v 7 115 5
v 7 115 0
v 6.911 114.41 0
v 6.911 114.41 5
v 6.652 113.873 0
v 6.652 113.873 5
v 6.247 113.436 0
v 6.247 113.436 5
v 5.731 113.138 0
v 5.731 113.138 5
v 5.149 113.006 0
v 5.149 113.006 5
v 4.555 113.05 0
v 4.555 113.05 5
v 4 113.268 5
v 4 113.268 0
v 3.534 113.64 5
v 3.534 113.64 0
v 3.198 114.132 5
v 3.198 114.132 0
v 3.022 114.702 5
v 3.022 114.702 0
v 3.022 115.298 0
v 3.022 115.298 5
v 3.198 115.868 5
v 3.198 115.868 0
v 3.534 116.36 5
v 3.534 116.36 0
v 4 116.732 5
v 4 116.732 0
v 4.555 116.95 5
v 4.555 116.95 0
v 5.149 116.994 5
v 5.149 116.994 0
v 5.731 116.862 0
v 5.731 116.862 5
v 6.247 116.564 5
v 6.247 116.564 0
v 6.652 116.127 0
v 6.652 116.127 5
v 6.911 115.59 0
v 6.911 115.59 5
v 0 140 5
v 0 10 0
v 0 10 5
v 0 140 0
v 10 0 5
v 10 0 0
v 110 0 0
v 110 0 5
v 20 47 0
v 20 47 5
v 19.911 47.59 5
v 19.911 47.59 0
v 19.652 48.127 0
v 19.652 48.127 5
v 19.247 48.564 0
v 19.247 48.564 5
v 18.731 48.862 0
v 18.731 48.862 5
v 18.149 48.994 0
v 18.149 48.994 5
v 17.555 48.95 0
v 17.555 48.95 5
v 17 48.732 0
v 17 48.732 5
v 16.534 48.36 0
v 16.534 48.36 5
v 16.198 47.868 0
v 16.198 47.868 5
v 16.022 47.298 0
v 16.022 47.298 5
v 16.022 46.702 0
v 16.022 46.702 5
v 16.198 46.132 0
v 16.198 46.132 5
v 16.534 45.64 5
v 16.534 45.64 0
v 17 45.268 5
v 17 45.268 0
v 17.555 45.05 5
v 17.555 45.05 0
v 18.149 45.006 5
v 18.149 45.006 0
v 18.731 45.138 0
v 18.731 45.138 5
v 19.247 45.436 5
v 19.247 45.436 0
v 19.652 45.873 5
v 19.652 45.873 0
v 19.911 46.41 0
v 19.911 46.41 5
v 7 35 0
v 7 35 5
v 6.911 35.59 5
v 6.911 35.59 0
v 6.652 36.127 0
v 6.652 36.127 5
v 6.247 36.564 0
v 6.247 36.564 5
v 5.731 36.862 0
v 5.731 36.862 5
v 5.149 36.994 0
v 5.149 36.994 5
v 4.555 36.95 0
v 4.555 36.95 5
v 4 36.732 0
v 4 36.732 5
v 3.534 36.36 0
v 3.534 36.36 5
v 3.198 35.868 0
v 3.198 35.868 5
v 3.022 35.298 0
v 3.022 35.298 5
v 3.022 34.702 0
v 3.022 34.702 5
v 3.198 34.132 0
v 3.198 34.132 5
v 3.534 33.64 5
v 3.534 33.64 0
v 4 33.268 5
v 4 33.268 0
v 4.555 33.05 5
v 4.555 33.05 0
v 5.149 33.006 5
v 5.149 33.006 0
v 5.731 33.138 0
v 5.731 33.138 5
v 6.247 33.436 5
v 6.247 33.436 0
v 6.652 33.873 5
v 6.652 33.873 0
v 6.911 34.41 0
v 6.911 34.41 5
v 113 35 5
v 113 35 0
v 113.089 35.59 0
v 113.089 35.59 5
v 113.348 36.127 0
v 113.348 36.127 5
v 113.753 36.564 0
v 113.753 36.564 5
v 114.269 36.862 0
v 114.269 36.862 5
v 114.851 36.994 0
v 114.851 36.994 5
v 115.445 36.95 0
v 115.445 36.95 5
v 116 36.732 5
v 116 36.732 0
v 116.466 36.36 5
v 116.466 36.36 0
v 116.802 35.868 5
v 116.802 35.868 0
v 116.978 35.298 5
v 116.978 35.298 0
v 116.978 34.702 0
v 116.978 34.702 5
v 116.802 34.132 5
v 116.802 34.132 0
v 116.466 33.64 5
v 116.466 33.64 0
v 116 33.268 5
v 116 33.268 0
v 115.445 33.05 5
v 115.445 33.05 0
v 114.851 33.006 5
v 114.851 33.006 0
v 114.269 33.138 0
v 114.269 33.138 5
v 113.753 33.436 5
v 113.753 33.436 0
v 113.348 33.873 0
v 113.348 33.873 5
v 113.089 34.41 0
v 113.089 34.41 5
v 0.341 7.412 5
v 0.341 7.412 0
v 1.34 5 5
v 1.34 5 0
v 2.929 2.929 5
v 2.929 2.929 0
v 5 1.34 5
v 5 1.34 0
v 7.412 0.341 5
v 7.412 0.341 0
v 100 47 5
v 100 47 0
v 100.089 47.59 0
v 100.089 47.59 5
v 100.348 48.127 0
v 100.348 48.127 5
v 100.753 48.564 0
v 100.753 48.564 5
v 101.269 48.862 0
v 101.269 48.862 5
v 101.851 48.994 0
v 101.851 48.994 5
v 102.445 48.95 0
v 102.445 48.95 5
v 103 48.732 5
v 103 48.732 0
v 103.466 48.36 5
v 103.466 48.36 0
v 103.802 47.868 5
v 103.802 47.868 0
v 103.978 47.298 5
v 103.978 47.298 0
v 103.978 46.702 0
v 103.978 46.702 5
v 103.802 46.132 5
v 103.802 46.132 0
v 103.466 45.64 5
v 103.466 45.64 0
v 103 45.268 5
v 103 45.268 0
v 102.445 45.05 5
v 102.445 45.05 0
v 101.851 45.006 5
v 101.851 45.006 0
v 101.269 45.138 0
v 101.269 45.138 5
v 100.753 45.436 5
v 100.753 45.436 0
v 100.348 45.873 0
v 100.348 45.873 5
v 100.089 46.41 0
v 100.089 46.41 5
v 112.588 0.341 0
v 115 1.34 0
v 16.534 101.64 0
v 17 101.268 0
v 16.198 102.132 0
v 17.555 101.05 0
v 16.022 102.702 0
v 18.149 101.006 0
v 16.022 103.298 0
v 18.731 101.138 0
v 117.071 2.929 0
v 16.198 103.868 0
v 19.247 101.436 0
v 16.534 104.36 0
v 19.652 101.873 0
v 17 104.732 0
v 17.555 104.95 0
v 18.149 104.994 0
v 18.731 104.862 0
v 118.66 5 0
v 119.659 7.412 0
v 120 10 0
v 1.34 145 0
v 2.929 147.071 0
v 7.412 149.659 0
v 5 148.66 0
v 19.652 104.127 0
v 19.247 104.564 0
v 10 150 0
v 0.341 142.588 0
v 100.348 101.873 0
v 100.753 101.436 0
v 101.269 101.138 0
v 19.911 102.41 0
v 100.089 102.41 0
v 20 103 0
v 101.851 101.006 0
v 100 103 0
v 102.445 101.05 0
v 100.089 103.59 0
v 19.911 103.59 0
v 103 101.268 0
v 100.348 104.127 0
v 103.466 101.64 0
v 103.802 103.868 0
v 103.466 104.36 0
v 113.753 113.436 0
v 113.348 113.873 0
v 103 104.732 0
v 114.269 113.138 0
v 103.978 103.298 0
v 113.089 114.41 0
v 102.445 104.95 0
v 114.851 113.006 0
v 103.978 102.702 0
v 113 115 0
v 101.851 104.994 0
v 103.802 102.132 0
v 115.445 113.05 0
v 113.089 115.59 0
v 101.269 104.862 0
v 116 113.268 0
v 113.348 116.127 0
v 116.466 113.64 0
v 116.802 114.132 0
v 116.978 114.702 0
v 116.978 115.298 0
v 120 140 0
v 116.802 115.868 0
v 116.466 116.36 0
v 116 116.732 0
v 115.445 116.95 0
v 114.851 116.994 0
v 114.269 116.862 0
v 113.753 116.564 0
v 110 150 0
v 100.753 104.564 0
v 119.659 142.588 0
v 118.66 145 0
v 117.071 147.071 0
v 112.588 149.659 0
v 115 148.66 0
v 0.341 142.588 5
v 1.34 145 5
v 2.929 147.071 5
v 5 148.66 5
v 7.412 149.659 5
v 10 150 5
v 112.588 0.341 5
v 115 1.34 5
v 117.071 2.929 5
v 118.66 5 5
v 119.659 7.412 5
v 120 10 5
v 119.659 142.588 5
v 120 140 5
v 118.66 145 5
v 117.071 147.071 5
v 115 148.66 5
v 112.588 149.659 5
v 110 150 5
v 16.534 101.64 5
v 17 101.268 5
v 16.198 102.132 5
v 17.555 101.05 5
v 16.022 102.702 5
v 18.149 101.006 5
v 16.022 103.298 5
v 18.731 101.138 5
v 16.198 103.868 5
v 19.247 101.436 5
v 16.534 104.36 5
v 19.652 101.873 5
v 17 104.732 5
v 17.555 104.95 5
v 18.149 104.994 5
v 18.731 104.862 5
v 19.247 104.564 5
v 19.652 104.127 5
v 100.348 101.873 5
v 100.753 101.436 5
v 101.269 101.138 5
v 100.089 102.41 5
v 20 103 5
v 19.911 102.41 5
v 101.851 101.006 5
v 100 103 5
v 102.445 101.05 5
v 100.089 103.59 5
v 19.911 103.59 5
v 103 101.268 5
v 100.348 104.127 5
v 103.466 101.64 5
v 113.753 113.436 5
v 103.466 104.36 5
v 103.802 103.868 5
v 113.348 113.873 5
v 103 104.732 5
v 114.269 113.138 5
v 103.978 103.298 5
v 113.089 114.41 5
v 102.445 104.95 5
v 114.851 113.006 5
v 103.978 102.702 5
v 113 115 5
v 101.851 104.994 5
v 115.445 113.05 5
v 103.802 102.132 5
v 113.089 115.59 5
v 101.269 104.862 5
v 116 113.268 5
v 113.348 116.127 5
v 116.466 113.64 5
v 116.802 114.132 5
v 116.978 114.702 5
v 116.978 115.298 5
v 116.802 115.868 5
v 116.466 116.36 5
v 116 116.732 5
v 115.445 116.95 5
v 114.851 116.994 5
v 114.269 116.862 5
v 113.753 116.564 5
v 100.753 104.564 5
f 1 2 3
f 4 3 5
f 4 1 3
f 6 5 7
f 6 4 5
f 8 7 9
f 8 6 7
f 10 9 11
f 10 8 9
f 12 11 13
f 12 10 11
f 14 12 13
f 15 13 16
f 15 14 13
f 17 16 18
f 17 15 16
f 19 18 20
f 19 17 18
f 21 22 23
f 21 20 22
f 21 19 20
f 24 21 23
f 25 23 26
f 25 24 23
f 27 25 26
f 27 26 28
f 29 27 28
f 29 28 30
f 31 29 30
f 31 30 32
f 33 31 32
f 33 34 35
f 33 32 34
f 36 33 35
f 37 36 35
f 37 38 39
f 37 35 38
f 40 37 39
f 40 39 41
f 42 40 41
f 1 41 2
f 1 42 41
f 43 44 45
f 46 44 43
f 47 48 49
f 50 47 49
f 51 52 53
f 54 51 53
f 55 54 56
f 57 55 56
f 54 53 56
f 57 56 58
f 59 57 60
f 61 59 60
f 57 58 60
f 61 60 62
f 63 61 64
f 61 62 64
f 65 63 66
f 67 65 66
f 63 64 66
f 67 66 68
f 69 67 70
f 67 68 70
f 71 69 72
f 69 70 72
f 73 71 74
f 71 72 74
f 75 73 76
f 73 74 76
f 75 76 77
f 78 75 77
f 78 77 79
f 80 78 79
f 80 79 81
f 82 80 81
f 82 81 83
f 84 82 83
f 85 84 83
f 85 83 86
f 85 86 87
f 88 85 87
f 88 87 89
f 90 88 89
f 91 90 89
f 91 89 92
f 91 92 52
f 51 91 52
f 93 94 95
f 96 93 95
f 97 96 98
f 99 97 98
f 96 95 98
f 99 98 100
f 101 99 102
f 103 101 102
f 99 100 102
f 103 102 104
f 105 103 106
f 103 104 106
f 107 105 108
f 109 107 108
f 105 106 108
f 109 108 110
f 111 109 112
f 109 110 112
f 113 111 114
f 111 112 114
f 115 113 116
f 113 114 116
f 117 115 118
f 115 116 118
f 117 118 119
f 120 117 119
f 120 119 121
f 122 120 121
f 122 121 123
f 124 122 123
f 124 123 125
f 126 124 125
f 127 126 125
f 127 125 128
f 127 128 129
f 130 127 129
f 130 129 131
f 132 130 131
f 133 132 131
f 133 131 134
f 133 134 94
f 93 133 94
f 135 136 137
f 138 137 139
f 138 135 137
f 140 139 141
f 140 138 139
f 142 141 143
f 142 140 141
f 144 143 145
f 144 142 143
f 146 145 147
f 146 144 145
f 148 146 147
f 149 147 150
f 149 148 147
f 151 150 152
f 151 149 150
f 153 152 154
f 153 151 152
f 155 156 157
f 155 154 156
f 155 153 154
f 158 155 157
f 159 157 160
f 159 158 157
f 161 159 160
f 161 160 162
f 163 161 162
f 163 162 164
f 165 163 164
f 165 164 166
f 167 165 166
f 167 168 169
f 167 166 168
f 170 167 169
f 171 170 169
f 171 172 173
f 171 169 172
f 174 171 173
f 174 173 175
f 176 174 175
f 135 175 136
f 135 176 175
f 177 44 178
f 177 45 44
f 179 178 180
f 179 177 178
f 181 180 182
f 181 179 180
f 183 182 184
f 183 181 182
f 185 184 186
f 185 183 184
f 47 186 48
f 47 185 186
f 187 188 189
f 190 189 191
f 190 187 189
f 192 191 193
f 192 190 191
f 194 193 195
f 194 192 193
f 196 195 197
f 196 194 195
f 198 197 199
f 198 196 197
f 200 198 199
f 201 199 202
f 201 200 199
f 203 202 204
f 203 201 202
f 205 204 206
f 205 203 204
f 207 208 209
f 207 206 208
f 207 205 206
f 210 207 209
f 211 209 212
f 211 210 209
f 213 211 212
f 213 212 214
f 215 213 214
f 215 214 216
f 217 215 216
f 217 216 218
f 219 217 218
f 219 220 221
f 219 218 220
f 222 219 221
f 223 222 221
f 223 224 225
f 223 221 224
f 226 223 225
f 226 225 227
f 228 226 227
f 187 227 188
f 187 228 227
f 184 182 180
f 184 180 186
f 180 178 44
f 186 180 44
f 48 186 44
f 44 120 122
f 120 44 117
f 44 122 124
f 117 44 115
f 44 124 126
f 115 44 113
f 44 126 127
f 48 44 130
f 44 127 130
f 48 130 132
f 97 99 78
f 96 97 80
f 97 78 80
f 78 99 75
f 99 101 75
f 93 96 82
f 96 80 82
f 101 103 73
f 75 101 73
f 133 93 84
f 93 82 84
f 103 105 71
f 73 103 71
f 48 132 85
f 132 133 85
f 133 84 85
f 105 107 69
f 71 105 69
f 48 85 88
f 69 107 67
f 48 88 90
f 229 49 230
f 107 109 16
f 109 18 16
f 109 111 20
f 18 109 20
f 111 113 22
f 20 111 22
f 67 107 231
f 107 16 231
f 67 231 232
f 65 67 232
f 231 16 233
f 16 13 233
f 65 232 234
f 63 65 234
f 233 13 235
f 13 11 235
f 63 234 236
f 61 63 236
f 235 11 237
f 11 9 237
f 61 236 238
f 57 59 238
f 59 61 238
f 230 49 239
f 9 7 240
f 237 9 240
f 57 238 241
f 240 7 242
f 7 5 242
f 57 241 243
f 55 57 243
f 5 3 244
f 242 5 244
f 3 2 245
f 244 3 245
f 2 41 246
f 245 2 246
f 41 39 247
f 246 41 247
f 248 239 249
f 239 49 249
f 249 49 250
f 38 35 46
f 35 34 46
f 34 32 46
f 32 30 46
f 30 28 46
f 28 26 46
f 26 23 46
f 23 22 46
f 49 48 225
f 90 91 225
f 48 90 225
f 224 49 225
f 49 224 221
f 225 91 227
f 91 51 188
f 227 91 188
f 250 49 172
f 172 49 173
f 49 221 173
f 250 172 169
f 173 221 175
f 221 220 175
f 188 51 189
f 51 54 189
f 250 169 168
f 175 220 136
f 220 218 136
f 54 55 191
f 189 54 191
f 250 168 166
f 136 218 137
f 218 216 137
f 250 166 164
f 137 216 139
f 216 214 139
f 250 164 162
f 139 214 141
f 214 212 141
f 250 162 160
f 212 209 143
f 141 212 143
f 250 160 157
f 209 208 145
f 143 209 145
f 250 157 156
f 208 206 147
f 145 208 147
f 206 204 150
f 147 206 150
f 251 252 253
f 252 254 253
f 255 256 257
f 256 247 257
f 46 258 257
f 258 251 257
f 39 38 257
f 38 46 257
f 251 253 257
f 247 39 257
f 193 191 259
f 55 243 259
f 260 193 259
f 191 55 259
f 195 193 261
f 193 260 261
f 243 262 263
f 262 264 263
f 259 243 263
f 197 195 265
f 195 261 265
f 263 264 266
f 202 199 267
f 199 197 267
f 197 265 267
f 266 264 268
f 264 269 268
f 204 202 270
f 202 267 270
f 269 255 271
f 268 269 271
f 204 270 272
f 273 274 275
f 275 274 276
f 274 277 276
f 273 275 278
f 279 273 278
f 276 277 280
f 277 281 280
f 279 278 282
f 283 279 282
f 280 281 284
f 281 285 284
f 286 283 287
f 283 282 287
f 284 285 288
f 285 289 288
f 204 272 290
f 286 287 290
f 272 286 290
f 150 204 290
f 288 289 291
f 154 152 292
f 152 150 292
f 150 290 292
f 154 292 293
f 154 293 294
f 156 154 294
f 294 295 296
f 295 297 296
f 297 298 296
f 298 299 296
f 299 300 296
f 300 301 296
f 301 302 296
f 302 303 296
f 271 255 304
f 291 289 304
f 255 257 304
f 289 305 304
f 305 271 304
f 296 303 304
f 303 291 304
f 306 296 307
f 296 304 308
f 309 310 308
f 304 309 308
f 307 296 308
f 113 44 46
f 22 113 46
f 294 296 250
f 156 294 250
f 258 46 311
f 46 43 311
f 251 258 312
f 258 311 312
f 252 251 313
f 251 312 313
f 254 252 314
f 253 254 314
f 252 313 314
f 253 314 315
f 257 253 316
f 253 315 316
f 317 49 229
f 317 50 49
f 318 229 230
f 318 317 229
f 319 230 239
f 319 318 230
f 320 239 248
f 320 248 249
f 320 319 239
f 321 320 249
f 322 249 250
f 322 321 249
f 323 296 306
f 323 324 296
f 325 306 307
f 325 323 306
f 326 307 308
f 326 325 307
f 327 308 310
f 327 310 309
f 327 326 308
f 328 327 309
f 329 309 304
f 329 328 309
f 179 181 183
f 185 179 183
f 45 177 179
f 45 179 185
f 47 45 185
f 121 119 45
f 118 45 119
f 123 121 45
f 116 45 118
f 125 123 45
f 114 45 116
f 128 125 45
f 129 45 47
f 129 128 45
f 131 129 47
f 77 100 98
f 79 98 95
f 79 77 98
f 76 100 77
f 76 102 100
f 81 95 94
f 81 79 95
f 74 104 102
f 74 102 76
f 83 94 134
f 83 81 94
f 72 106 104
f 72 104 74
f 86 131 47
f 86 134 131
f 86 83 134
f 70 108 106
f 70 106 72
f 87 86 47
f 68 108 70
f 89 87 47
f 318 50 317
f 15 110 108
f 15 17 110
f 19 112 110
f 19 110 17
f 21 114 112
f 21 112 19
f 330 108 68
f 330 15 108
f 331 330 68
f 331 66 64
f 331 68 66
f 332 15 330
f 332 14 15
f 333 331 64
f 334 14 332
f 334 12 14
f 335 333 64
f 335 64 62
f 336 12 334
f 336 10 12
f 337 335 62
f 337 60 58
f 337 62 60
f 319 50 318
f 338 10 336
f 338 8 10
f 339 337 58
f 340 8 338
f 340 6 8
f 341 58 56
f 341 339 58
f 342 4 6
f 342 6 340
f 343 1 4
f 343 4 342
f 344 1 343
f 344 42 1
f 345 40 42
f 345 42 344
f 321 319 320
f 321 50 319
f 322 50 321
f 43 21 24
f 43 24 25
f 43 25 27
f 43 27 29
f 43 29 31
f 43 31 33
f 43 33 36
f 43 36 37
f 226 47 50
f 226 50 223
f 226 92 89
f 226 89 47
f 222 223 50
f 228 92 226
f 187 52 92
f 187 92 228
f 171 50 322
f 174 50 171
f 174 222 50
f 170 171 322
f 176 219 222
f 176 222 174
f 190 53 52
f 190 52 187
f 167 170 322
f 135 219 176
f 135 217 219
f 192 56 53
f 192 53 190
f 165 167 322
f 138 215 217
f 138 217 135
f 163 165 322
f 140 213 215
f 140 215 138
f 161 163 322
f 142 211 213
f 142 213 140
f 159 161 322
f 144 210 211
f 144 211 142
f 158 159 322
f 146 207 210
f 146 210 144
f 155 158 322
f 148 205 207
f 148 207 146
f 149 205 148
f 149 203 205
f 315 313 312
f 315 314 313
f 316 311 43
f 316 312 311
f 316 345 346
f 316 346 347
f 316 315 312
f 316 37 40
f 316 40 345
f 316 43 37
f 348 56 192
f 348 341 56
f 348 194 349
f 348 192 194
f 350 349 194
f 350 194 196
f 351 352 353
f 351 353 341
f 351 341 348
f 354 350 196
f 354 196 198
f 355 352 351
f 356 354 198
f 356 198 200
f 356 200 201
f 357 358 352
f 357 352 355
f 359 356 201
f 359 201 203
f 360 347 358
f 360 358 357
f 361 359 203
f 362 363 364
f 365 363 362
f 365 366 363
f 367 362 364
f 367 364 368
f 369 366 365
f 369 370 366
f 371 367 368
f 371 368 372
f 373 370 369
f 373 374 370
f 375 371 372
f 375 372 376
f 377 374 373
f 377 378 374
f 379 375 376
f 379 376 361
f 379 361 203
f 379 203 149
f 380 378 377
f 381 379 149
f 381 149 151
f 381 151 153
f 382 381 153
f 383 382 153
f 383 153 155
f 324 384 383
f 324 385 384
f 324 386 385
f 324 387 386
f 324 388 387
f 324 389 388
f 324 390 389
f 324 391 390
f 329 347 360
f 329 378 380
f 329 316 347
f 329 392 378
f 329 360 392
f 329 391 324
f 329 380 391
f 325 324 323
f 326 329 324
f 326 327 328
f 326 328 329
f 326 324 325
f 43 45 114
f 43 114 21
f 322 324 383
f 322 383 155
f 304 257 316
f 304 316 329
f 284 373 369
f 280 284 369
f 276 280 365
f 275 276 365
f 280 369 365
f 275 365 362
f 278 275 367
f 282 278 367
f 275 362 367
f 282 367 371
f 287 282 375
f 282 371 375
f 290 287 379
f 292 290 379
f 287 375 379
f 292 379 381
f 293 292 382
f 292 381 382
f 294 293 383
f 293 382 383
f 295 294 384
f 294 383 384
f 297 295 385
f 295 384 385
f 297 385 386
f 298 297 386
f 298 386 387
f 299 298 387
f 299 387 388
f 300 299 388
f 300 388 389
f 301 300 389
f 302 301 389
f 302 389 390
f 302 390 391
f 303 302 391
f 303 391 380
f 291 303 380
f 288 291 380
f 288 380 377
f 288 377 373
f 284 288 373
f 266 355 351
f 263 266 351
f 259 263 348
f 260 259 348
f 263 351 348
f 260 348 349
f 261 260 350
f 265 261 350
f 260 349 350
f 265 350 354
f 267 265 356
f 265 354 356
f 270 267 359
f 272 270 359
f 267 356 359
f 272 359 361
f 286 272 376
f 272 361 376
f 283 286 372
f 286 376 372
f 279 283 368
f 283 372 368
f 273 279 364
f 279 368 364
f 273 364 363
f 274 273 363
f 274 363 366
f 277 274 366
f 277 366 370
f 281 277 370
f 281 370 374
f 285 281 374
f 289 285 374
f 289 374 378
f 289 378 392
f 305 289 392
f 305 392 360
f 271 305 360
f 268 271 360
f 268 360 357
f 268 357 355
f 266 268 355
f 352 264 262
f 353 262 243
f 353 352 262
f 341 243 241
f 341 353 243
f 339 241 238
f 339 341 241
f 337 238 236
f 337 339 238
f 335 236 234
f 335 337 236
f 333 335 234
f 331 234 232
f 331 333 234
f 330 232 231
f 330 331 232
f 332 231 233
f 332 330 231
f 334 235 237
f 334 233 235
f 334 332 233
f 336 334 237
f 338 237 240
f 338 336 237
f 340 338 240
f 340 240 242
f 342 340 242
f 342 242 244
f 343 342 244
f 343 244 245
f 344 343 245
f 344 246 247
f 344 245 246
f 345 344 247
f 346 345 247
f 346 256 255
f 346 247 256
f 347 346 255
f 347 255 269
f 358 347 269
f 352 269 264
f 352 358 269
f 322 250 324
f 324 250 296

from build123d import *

# Parameters (mm, degrees)
SKETCH_1_W               = 120
SKETCH_1_H               = 150
EXTRUDE_1_DEPTH          = 5
FILLET_1_R               = 10
SKETCH_2_R               = 2
CUT_EXTRUDE_1_DEPTH      = 10
MIRROR_2_COPY_1_SKETCH_R = 2
MIRROR_2_COPY_1_DEPTH    = 10


with BuildPart() as part:
    # 草图1 → 凸台-拉伸1 (new body)
    with BuildSketch(Plane.XY):
        with Locations((60, 75)):
            Rectangle(SKETCH_1_W, SKETCH_1_H)
    extrude(amount=EXTRUDE_1_DEPTH)

    # 圆角1
    fillet_1_edges = [part.edges().sort_by_distance(p)[0] for p in [
        (0, 0, 2.5),
        (0, 150, 2.5),
        (120, 150, 2.5),
        (120, 0, 2.5),
    ]]
    fillet(fillet_1_edges, radius=FILLET_1_R)

    # 草图2 → 切除-拉伸1 (cut)
    with BuildSketch(Plane.XY.offset(5)):
        with Locations((18, 47)):
            Circle(SKETCH_2_R)
        with Locations((5, 35)):
            Circle(SKETCH_2_R)
    cut_extrude_1 = extrude(amount=-CUT_EXTRUDE_1_DEPTH, mode=Mode.SUBTRACT)

    # 镜向1: 切除-拉伸1 across plane
    add(cut_extrude_1.mirror(Plane(origin=(0, 75, 0), x_dir=(0, 0, 1), z_dir=(0, -1, 0))), mode=Mode.SUBTRACT)

    # 镜向2: 切除-拉伸1 across plane
    add(cut_extrude_1.mirror(Plane.ZY.offset(-60)), mode=Mode.SUBTRACT)

    # 镜向2 copy 1 sketch → 镜向2 copy 1 (cut)
    with BuildSketch(Plane(origin=(120, 150, 5), x_dir=(-1, 0, 0), z_dir=(0, 0, 1))):
        with Locations((18, 47)):
            Circle(MIRROR_2_COPY_1_SKETCH_R)
        with Locations((5, 35)):
            Circle(MIRROR_2_COPY_1_SKETCH_R)
    extrude(amount=-MIRROR_2_COPY_1_DEPTH, mode=Mode.SUBTRACT)


solid = part.part
